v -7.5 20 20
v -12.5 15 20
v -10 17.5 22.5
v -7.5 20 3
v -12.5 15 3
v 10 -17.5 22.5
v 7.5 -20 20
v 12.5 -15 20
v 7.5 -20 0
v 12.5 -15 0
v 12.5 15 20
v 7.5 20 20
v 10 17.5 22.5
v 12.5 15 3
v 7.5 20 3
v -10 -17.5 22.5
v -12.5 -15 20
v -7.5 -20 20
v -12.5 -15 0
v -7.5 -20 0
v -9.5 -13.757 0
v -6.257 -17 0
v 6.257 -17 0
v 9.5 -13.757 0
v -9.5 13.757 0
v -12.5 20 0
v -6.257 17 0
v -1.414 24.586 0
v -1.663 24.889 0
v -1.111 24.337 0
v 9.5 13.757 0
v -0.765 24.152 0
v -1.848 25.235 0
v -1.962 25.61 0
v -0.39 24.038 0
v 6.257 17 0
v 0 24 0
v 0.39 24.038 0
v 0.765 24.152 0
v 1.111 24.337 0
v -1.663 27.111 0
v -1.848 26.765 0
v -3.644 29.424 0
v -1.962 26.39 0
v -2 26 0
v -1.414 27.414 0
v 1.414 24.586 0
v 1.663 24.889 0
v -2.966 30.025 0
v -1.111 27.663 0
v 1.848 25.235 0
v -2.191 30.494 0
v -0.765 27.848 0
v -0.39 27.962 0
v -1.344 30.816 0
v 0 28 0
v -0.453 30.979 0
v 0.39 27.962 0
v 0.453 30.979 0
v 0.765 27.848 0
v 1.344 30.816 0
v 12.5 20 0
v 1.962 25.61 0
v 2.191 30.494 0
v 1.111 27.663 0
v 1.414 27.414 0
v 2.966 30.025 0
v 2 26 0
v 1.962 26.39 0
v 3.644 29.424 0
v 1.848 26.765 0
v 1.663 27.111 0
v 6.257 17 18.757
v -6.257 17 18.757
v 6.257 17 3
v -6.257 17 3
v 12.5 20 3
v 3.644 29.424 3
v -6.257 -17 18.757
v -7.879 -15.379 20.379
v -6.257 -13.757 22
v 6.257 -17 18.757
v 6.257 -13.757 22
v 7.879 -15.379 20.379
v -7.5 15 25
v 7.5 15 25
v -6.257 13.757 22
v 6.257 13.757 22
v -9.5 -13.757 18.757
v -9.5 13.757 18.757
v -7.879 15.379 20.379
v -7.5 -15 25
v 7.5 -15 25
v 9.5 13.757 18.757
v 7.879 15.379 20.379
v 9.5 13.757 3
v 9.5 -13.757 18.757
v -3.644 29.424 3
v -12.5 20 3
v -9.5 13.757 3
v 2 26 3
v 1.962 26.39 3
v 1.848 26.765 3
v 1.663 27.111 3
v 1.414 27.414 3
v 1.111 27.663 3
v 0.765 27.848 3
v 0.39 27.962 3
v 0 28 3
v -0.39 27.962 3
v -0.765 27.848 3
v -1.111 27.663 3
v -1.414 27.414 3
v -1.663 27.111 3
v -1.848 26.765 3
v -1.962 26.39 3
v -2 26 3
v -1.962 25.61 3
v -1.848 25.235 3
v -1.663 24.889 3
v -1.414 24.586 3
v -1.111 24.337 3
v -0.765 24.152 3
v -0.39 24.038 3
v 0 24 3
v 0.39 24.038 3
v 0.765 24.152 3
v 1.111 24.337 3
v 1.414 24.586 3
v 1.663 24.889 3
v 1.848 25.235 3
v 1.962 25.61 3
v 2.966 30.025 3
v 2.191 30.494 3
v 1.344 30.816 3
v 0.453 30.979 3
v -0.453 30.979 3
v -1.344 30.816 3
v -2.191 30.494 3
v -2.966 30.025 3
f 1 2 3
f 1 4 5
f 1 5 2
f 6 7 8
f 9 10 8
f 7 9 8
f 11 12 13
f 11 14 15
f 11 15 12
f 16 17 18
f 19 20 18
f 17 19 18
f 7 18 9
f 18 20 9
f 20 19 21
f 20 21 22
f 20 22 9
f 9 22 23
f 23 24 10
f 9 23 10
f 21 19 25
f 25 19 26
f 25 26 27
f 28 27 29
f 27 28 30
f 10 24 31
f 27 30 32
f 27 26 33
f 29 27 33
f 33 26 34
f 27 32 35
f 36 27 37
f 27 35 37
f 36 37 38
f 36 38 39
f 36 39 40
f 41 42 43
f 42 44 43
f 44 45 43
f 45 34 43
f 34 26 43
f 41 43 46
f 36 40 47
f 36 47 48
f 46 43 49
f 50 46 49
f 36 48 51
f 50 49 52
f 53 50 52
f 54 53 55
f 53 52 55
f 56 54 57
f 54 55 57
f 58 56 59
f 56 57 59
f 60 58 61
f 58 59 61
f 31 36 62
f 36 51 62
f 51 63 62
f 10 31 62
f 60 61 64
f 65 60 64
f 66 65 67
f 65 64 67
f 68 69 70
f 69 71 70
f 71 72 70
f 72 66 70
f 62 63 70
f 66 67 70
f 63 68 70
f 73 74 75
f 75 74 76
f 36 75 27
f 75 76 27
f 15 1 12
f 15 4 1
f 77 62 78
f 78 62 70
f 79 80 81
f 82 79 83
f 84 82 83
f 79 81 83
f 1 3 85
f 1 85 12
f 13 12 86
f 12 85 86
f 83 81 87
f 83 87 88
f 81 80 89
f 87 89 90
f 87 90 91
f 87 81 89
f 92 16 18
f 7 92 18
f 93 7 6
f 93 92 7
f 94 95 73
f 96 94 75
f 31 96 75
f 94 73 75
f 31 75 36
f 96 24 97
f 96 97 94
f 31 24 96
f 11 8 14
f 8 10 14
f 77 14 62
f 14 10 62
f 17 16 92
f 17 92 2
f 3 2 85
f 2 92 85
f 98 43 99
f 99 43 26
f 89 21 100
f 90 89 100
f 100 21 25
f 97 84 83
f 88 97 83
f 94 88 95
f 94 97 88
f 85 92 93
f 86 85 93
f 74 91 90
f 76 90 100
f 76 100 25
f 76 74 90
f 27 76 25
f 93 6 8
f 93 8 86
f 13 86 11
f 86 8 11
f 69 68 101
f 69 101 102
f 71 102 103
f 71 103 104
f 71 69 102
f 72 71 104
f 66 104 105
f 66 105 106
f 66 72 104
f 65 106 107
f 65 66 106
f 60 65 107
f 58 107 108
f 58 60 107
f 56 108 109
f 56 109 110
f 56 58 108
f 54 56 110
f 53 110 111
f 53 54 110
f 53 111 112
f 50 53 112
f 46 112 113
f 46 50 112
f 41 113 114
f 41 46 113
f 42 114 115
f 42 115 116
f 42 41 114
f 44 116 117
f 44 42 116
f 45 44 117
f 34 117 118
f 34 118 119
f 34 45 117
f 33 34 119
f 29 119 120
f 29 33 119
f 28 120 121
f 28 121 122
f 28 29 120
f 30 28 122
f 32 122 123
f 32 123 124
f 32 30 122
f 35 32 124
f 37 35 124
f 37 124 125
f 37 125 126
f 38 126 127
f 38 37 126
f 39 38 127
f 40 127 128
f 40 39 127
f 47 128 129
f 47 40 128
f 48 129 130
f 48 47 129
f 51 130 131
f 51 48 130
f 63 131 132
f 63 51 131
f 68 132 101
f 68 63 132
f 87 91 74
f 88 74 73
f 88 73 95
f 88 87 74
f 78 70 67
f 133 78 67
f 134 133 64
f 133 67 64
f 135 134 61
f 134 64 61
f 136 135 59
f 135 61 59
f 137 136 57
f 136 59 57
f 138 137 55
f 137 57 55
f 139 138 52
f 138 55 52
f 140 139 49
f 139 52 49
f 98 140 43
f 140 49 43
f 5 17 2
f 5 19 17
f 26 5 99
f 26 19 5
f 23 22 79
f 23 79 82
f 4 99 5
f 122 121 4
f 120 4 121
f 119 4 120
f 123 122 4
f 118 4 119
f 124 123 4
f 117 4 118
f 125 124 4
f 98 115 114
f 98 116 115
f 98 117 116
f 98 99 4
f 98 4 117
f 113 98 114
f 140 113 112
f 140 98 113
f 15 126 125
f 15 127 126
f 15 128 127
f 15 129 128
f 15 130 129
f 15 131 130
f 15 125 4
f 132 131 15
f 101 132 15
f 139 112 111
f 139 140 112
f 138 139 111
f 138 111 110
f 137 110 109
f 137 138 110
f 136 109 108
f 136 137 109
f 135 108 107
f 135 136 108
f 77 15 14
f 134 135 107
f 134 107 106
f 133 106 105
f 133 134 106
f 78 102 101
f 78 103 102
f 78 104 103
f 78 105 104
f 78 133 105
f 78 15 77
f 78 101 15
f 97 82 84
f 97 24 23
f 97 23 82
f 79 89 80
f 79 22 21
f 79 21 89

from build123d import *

# Parameters (mm, degrees)
F0_W        = 25
F0_H        = 40
F1_DEPTH    = 25
F0_R        = 2
F2_DEPTH    = 3
F3_SIZE     = 5
F4_SIZE     = 5
F5_T        = 3
F5_T3_DEPTH = 21
F5_T5_DEPTH = 13.0710678119
F5_T7_DEPTH = 13.0710678119


# Not quite as in the source:
# - a shell that OpenCascade refuses in one call is made with other operations: the cavity is built on its own and cut out


with BuildPart() as f1:
    # F0 (on Top) → F1 (new body)
    with BuildSketch(Plane.XY):
        Rectangle(F0_W, F0_H)
    extrude(amount=F1_DEPTH)

    # F0 (on Top) → F2 (join)
    with BuildSketch(Plane.XY):
        with BuildLine():
            Line((-3.6435657461, 29.4240953044), (-12.5, 20))
            Line((-12.5, 20), (12.5, 20))
            Line((12.5, 20), (3.6435657461, 29.4240953044))
            ThreePointArc((3.6435657461, 29.4240953044), (4.6485389495, 27.8414900583), (5, 26))
            ThreePointArc((5, 26), (-1.8414900583, 21.3514610505), (-3.6435657461, 29.4240953044))
        make_face()
        with BuildLine():
            ThreePointArc((3.6435657461, 29.4240953044), (0, 31), (-3.6435657461, 29.4240953044))
            ThreePointArc((-3.6435657461, 29.4240953044), (-1.8414900583, 21.3514610505), (5, 26))
            ThreePointArc((5, 26), (4.6485389495, 27.8414900583), (3.6435657461, 29.4240953044))
        make_face()
        with Locations((0, 26)):
            Circle(F0_R, mode=Mode.SUBTRACT)
    extrude(amount=F2_DEPTH)

    # F3
    f3_edges = [f1.edges().sort_by_distance(p)[0] for p in [
        (12.5, 0, 25),
        (0, -20, 25),
        (-12.5, 0, 25),
        (0, 20, 25),
    ]]
    chamfer(f3_edges, length=F3_SIZE)

    # F4
    f4_edges = [f1.edges().sort_by_distance(p)[0] for p in [
        (-12.5, -20, 10),
        (12.5, -20, 10),
        (12.5, 20, 11.5),
        (-12.5, 20, 11.5),
    ]]
    chamfer(f4_edges, length=F4_SIZE)

    # F5: shell of thickness 3, made by hand


with BuildPart() as f5_core1:
    # F5_t2: copy of F1
    add(f1.part)

    # the walls: a layer under each face that stays
    f5_faces = [f5_core1.faces().sort_by_distance(p)[0] for p in [
        (0, 20, 11.5),
        (0, 17.5, 22.5),
        (10, 17.5, 12.75),
        (-10, 17.5, 12.75),
        (0, 23, 3),
        (10, 0, 22.5),
        (0, 0, 25),
        (-10, 0, 22.5),
        (12.5, 2.5, 10),
        (-12.5, 2.5, 10),
        (-8.0717828731, 24.7120476522, 1.5),
        (8.0717828731, 24.7120476522, 1.5),
        (0, 31, 1.5),
        (-2, 26, 1.5),
        (0, -17.5, 22.5),
        (10, -17.5, 11.25),
        (-10, -17.5, 11.25),
        (0, -20, 10),
    ]]
    thicken(f5_faces, amount=-F5_T, mode=Mode.SUBTRACT)

    # F5_s4 → F5_t3 (cut)
    with BuildSketch(Plane.YZ.offset(-10.5)):
        Polygon((20.03, 3.03), (17, 3), (17, 0), (20, 0), align=None)
    extrude(amount=F5_T3_DEPTH, mode=Mode.SUBTRACT)

    # F5_s6 → F5_t5 (cut)
    with BuildSketch(Plane(origin=(-8.3713203436, 8.3713203436, 0), x_dir=(0, 0, 1), z_dir=(0.7071067812, -0.7071067812, 0))):
        Polygon((3.03, -19.4754364826), (3, -16.4454364826), (0, -16.4454364826), (0, -19.4454364826), align=None)
    extrude(amount=F5_T5_DEPTH, mode=Mode.SUBTRACT)

    # F5_s8 → F5_t7 (cut)
    with BuildSketch(Plane(origin=(8.3713203436, 8.3713203436, 0), x_dir=(0, 0, 1), z_dir=(-0.7071067812, -0.7071067812, 0))):
        Polygon((3.03, 19.4754364826), (3, 16.4454364826), (0, 16.4454364826), (0, 19.4454364826), align=None)
    extrude(amount=F5_T7_DEPTH, mode=Mode.SUBTRACT)


with BuildPart() as f1_1:
    add(f1.part)

    # what is left inside the walls is the cavity
    f5_cavity = [f5_core1.part.solids().sort_by_distance(p)[0] for p in [
        (0, -5.666667, 0.03),
    ]]
    add(f5_cavity, mode=Mode.SUBTRACT)


solid = f1_1.part
